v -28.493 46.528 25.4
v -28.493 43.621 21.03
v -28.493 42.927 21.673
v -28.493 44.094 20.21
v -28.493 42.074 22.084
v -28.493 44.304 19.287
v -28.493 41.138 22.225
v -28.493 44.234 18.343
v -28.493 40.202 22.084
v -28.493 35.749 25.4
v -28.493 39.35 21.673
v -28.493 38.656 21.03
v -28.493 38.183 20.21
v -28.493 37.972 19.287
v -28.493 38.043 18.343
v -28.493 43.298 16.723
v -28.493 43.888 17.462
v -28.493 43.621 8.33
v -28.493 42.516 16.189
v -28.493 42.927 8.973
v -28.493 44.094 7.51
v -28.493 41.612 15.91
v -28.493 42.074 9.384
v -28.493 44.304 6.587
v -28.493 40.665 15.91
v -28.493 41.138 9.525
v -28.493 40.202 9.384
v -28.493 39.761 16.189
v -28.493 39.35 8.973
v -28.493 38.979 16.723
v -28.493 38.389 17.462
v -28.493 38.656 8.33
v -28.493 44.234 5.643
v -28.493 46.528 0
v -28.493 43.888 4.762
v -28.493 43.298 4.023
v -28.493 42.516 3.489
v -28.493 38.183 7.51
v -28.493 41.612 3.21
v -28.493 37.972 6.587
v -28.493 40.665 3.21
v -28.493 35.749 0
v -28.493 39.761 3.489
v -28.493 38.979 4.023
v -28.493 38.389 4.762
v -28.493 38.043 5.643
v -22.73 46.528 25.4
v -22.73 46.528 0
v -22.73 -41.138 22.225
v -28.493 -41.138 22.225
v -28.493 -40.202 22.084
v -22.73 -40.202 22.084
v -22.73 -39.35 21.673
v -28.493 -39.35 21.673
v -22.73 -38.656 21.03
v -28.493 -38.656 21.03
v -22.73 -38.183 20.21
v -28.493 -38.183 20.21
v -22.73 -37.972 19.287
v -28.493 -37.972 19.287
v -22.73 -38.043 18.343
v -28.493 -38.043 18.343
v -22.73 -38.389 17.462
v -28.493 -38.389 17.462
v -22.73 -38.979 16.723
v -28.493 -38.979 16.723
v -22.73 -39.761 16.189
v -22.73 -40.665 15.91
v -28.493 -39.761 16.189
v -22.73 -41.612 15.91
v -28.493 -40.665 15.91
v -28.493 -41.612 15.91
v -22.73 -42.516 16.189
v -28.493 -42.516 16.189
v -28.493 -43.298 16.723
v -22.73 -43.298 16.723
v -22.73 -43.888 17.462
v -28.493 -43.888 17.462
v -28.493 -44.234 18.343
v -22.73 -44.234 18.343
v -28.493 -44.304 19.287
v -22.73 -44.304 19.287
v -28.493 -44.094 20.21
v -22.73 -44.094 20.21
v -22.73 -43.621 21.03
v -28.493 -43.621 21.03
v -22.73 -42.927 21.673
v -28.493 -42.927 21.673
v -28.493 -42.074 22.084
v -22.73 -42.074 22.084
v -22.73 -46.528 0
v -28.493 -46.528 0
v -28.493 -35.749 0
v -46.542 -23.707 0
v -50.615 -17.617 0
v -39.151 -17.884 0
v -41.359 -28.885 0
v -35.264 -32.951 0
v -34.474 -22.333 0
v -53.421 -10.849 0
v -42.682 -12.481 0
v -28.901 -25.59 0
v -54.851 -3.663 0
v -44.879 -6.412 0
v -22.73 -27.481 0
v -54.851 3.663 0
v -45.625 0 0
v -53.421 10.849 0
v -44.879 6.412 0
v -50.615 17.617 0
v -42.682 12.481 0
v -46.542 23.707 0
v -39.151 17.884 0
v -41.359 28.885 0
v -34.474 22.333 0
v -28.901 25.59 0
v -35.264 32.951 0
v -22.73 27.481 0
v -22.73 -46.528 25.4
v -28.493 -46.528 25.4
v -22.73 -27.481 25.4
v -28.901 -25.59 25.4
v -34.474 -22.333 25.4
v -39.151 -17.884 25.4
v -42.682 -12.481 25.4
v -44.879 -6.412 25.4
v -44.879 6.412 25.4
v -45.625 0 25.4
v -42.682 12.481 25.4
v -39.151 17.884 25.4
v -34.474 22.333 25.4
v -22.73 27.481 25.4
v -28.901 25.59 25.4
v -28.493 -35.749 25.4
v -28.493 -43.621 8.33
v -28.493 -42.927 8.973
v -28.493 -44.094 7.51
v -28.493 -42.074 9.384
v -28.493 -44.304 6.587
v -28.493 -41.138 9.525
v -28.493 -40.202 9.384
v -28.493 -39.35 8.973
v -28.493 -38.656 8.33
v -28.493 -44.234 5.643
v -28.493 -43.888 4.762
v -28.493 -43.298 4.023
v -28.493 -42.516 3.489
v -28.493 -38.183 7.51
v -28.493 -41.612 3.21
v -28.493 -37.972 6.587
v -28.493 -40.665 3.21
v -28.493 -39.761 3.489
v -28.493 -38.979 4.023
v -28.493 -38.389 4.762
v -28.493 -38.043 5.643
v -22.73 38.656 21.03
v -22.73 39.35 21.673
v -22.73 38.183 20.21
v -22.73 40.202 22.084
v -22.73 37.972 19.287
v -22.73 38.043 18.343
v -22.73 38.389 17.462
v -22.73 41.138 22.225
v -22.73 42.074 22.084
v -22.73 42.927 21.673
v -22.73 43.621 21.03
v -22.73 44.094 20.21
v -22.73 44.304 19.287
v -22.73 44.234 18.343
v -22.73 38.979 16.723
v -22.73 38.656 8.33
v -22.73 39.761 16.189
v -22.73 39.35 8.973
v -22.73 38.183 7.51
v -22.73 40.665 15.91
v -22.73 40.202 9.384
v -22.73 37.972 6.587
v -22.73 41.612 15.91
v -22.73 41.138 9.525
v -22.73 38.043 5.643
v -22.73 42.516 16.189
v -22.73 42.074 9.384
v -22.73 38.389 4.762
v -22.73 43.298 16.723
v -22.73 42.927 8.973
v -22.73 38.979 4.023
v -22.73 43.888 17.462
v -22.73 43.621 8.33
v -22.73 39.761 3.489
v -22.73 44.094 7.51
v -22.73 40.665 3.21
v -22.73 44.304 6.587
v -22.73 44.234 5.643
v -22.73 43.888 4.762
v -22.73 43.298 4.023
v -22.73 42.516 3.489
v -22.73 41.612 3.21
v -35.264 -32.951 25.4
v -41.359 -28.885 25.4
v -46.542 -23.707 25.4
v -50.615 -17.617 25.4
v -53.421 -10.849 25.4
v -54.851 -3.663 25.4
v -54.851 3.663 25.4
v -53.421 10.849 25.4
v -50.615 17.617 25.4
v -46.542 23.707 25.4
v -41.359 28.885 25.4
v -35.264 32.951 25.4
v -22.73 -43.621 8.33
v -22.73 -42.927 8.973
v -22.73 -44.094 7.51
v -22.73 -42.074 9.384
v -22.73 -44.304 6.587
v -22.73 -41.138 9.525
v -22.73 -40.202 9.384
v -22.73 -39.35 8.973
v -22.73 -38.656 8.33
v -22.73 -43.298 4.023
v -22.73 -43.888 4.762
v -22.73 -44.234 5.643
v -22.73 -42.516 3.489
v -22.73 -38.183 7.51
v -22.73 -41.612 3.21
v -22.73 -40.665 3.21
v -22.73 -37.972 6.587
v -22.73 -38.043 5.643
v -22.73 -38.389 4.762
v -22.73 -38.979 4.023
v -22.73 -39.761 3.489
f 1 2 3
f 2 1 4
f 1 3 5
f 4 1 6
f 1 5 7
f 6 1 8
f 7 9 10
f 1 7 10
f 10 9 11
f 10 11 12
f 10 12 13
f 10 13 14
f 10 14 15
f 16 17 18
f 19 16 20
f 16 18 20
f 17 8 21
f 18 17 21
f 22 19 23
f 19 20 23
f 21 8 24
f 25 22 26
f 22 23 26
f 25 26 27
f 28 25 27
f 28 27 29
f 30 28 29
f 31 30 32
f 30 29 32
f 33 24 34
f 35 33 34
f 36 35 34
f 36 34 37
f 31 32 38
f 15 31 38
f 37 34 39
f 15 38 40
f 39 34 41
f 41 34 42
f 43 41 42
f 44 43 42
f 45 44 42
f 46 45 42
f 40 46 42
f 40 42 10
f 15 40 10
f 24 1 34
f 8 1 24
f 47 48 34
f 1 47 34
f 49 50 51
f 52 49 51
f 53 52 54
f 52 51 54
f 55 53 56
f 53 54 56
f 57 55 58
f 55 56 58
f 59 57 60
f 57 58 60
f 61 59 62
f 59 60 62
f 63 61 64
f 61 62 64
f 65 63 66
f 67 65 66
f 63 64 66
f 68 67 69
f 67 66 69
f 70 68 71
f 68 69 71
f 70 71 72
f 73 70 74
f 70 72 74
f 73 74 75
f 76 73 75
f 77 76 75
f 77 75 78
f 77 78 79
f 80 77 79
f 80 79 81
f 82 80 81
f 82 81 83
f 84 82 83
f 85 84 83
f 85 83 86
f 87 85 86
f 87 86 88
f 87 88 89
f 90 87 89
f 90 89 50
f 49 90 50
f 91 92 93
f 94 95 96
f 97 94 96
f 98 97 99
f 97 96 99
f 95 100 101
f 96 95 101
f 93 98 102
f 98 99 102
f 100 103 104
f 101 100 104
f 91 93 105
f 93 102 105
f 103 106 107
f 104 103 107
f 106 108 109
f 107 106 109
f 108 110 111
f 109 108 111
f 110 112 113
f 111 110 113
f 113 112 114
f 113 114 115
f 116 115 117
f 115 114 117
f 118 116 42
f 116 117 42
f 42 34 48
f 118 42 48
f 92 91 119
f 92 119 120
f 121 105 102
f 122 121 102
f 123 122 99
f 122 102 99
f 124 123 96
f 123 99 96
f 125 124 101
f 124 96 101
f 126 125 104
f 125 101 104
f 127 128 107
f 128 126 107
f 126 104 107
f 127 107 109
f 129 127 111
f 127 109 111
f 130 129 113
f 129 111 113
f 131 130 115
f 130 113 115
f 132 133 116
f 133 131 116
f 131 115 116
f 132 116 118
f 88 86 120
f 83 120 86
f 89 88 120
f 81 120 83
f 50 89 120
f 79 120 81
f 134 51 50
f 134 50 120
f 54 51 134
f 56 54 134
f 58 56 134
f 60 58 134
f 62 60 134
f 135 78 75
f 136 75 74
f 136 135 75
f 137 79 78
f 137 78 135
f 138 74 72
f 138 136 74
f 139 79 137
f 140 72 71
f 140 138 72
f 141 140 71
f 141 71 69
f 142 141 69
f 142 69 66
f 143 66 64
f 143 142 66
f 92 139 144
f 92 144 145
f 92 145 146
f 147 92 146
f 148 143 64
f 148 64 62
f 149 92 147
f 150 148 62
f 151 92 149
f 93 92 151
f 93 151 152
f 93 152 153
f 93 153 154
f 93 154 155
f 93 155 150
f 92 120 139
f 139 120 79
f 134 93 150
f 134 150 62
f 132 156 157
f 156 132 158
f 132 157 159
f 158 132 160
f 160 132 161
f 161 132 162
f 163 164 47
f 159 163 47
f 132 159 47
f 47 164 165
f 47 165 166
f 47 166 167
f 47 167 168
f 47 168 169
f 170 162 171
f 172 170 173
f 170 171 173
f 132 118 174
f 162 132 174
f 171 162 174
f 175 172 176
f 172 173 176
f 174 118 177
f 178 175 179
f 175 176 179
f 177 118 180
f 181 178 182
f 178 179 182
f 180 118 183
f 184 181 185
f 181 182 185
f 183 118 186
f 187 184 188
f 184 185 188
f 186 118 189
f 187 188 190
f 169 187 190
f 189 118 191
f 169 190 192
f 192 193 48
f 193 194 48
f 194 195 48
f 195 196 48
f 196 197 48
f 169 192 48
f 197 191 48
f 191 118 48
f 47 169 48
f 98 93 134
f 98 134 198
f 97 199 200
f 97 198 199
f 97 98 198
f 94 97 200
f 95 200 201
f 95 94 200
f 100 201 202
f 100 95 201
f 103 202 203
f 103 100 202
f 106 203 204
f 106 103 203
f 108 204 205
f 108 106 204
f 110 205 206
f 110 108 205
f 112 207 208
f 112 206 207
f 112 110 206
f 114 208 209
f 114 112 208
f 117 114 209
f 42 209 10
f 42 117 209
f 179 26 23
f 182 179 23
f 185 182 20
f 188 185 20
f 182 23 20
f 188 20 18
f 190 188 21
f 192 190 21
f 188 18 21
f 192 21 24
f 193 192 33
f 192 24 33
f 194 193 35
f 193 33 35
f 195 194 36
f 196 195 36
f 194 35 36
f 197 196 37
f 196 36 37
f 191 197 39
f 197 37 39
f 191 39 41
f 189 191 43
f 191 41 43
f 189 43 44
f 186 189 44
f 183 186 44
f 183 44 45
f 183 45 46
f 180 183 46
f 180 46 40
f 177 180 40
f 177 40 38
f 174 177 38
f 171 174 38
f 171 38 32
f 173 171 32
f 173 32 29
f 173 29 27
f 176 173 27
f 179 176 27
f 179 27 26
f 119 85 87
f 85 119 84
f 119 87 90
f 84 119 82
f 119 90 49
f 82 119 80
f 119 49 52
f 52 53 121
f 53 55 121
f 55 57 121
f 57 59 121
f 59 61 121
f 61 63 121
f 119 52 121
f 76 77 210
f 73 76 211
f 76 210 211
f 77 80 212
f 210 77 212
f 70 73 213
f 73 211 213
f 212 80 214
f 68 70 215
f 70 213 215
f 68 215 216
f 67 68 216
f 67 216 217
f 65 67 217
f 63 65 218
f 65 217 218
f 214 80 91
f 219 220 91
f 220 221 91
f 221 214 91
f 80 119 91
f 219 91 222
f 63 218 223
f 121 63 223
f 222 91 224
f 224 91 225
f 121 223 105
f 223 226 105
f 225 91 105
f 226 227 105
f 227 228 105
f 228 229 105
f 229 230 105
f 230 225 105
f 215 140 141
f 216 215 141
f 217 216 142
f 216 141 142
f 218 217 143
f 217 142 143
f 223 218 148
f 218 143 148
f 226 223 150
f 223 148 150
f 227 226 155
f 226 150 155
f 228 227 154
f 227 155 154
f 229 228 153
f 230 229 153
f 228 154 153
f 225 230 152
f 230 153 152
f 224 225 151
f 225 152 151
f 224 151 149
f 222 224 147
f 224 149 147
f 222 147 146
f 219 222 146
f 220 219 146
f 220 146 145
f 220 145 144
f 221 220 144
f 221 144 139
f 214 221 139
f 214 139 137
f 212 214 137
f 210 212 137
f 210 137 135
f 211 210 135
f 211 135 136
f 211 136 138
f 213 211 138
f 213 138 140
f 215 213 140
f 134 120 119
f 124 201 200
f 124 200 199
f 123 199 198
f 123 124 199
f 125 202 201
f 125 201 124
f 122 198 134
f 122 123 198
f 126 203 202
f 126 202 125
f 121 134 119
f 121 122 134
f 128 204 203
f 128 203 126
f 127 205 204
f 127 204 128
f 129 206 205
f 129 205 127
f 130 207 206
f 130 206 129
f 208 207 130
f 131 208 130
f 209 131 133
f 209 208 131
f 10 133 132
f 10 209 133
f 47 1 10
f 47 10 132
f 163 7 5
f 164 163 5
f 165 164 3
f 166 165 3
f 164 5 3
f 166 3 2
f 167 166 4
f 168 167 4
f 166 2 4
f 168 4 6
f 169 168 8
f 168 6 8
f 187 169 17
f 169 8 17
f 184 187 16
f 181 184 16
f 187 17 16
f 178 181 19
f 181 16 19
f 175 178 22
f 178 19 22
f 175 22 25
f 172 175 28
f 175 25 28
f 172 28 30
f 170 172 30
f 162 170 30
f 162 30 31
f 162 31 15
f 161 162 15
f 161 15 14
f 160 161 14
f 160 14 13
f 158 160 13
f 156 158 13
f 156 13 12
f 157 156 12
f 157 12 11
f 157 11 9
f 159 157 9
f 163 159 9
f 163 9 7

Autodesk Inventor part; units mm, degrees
ref_plane "YZ Plane" through (0, 0, 0) normal (1, 0, 0) x (0, 1, 0)
ref_plane "XZ Plane" through (0, 0, 0) normal (0, 1, 0) x (-1, 0, 0)
ref_plane "XY Plane" through (0, 0, 0) normal (0, 0, 1) x (1, 0, 0)
sketch "Sketch1" plane through (0, 0, 0) normal (0, 0, 1) x (1, 0, 0)
  arc A0 (-11.3451, -36.1483) -> (17.6265, -10) centre (-17.6849, 0) ccw projected
  line L0 (17.6265, -10) -> (19.0151, -10) projected
  line L1 (19.0151, -10) -> (19.0151, 10) projected
  line L2 (19.0151, 10) -> (17.6265, 10) projected
  arc A1 (17.6265, 10) -> (-11.3451, 36.1483) centre (-17.6849, 0) ccw projected
  line L3 (-11.3451, 36.1483) -> (-11.3451, 46.225) projected
  line L4 (-17.6951, 46.225) -> (-11.3451, 46.225) projected
  line L5 (-17.6951, 25.4) -> (-17.6951, 46.225) projected
  arc A2 (-17.6951, -25.4) -> (-17.6951, 25.4) centre (-17.6849, 0) ccw projected
  line L6 (-17.6951, -46.225) -> (-17.6951, -25.4) projected
  line L7 (-17.6951, -46.225) -> (-11.3451, -46.225) projected
  line L8 (-11.3451, -36.1483) -> (-11.3451, -46.225) projected
  circle A3 centre (-17.6849, 0) radius 25.4
  arc A4 (-22.7296, 27.4808) -> (-22.7296, -27.4808) centre (-17.6849, 0) ccw
  line L9 (-22.7296, -46.5279) -> (-22.7296, -27.4808)
  line L10 (-22.7296, -46.5279) -> (-28.4927, -46.5279)
  line L11 (-22.7296, -27.4808) -> (-22.7296, 27.4808) construction
  arc A5 (-28.4927, 35.7486) -> (-28.4927, -35.7486) centre (-17.6849, 0) ccw
  line L12 (-22.7296, 27.4808) -> (-22.7296, 37.0044)
  line L13 (-28.4927, -46.5279) -> (-28.4927, -35.7486)
  line L14 (-17.6849, 0) -> (-81.3039, 0) construction
  line L15 (-22.7296, 46.5279) -> (-22.7296, 27.4808)
  line L16 (-22.7296, 46.5279) -> (-28.4927, 46.5279)
  line L17 (-28.4927, 46.5279) -> (-28.4927, 35.7486)
  point P0 (0, 0)
  dimension "d0" = 2.54
  dimension "d1" = 0
  dimension "d2" = 0.3029
extrude "Extrusion1" add sketch "Sketch1" along normal blind 25.4 contours A4 L9 L10 L13 A5 L17 L16 L15 L12
sketch "Sketch2" plane through (-28.4927, 35.7486, 0) normal (-1, 0, 0) x (0, 0, 1)
  line L0 (0, -8.2678) -> (0, 10.7793) projected
  line L1 (25.4, 10.7793) -> (25.4, 0) projected
  line L2 (0, 10.7793) -> (25.4, 0) construction
  line L3 (12.7, 5.3897) -> (0, 5.3897) construction
  line L4 (12.7, 5.3897) -> (25.4, 5.3897) construction
  circle A0 centre (19.05, 5.3897) radius 3.175
  circle A1 centre (6.35, 5.3897) radius 3.175
  point P0 (0, -35.7486)
  dimension "d5" = 6.35
extrude "Extrusion2" cut sketch "Sketch2" against normal blind 25.4
ref_plane "Work Plane1" through (-28.4927, 0, 0) normal (0, 1, 0) x (1, 0, 0)
mirror "Mirror1" about plane through (-28.4927, 0, 0) normal (0, 1, 0) of "Extrusion2"
properties part number "dremelClamp"
